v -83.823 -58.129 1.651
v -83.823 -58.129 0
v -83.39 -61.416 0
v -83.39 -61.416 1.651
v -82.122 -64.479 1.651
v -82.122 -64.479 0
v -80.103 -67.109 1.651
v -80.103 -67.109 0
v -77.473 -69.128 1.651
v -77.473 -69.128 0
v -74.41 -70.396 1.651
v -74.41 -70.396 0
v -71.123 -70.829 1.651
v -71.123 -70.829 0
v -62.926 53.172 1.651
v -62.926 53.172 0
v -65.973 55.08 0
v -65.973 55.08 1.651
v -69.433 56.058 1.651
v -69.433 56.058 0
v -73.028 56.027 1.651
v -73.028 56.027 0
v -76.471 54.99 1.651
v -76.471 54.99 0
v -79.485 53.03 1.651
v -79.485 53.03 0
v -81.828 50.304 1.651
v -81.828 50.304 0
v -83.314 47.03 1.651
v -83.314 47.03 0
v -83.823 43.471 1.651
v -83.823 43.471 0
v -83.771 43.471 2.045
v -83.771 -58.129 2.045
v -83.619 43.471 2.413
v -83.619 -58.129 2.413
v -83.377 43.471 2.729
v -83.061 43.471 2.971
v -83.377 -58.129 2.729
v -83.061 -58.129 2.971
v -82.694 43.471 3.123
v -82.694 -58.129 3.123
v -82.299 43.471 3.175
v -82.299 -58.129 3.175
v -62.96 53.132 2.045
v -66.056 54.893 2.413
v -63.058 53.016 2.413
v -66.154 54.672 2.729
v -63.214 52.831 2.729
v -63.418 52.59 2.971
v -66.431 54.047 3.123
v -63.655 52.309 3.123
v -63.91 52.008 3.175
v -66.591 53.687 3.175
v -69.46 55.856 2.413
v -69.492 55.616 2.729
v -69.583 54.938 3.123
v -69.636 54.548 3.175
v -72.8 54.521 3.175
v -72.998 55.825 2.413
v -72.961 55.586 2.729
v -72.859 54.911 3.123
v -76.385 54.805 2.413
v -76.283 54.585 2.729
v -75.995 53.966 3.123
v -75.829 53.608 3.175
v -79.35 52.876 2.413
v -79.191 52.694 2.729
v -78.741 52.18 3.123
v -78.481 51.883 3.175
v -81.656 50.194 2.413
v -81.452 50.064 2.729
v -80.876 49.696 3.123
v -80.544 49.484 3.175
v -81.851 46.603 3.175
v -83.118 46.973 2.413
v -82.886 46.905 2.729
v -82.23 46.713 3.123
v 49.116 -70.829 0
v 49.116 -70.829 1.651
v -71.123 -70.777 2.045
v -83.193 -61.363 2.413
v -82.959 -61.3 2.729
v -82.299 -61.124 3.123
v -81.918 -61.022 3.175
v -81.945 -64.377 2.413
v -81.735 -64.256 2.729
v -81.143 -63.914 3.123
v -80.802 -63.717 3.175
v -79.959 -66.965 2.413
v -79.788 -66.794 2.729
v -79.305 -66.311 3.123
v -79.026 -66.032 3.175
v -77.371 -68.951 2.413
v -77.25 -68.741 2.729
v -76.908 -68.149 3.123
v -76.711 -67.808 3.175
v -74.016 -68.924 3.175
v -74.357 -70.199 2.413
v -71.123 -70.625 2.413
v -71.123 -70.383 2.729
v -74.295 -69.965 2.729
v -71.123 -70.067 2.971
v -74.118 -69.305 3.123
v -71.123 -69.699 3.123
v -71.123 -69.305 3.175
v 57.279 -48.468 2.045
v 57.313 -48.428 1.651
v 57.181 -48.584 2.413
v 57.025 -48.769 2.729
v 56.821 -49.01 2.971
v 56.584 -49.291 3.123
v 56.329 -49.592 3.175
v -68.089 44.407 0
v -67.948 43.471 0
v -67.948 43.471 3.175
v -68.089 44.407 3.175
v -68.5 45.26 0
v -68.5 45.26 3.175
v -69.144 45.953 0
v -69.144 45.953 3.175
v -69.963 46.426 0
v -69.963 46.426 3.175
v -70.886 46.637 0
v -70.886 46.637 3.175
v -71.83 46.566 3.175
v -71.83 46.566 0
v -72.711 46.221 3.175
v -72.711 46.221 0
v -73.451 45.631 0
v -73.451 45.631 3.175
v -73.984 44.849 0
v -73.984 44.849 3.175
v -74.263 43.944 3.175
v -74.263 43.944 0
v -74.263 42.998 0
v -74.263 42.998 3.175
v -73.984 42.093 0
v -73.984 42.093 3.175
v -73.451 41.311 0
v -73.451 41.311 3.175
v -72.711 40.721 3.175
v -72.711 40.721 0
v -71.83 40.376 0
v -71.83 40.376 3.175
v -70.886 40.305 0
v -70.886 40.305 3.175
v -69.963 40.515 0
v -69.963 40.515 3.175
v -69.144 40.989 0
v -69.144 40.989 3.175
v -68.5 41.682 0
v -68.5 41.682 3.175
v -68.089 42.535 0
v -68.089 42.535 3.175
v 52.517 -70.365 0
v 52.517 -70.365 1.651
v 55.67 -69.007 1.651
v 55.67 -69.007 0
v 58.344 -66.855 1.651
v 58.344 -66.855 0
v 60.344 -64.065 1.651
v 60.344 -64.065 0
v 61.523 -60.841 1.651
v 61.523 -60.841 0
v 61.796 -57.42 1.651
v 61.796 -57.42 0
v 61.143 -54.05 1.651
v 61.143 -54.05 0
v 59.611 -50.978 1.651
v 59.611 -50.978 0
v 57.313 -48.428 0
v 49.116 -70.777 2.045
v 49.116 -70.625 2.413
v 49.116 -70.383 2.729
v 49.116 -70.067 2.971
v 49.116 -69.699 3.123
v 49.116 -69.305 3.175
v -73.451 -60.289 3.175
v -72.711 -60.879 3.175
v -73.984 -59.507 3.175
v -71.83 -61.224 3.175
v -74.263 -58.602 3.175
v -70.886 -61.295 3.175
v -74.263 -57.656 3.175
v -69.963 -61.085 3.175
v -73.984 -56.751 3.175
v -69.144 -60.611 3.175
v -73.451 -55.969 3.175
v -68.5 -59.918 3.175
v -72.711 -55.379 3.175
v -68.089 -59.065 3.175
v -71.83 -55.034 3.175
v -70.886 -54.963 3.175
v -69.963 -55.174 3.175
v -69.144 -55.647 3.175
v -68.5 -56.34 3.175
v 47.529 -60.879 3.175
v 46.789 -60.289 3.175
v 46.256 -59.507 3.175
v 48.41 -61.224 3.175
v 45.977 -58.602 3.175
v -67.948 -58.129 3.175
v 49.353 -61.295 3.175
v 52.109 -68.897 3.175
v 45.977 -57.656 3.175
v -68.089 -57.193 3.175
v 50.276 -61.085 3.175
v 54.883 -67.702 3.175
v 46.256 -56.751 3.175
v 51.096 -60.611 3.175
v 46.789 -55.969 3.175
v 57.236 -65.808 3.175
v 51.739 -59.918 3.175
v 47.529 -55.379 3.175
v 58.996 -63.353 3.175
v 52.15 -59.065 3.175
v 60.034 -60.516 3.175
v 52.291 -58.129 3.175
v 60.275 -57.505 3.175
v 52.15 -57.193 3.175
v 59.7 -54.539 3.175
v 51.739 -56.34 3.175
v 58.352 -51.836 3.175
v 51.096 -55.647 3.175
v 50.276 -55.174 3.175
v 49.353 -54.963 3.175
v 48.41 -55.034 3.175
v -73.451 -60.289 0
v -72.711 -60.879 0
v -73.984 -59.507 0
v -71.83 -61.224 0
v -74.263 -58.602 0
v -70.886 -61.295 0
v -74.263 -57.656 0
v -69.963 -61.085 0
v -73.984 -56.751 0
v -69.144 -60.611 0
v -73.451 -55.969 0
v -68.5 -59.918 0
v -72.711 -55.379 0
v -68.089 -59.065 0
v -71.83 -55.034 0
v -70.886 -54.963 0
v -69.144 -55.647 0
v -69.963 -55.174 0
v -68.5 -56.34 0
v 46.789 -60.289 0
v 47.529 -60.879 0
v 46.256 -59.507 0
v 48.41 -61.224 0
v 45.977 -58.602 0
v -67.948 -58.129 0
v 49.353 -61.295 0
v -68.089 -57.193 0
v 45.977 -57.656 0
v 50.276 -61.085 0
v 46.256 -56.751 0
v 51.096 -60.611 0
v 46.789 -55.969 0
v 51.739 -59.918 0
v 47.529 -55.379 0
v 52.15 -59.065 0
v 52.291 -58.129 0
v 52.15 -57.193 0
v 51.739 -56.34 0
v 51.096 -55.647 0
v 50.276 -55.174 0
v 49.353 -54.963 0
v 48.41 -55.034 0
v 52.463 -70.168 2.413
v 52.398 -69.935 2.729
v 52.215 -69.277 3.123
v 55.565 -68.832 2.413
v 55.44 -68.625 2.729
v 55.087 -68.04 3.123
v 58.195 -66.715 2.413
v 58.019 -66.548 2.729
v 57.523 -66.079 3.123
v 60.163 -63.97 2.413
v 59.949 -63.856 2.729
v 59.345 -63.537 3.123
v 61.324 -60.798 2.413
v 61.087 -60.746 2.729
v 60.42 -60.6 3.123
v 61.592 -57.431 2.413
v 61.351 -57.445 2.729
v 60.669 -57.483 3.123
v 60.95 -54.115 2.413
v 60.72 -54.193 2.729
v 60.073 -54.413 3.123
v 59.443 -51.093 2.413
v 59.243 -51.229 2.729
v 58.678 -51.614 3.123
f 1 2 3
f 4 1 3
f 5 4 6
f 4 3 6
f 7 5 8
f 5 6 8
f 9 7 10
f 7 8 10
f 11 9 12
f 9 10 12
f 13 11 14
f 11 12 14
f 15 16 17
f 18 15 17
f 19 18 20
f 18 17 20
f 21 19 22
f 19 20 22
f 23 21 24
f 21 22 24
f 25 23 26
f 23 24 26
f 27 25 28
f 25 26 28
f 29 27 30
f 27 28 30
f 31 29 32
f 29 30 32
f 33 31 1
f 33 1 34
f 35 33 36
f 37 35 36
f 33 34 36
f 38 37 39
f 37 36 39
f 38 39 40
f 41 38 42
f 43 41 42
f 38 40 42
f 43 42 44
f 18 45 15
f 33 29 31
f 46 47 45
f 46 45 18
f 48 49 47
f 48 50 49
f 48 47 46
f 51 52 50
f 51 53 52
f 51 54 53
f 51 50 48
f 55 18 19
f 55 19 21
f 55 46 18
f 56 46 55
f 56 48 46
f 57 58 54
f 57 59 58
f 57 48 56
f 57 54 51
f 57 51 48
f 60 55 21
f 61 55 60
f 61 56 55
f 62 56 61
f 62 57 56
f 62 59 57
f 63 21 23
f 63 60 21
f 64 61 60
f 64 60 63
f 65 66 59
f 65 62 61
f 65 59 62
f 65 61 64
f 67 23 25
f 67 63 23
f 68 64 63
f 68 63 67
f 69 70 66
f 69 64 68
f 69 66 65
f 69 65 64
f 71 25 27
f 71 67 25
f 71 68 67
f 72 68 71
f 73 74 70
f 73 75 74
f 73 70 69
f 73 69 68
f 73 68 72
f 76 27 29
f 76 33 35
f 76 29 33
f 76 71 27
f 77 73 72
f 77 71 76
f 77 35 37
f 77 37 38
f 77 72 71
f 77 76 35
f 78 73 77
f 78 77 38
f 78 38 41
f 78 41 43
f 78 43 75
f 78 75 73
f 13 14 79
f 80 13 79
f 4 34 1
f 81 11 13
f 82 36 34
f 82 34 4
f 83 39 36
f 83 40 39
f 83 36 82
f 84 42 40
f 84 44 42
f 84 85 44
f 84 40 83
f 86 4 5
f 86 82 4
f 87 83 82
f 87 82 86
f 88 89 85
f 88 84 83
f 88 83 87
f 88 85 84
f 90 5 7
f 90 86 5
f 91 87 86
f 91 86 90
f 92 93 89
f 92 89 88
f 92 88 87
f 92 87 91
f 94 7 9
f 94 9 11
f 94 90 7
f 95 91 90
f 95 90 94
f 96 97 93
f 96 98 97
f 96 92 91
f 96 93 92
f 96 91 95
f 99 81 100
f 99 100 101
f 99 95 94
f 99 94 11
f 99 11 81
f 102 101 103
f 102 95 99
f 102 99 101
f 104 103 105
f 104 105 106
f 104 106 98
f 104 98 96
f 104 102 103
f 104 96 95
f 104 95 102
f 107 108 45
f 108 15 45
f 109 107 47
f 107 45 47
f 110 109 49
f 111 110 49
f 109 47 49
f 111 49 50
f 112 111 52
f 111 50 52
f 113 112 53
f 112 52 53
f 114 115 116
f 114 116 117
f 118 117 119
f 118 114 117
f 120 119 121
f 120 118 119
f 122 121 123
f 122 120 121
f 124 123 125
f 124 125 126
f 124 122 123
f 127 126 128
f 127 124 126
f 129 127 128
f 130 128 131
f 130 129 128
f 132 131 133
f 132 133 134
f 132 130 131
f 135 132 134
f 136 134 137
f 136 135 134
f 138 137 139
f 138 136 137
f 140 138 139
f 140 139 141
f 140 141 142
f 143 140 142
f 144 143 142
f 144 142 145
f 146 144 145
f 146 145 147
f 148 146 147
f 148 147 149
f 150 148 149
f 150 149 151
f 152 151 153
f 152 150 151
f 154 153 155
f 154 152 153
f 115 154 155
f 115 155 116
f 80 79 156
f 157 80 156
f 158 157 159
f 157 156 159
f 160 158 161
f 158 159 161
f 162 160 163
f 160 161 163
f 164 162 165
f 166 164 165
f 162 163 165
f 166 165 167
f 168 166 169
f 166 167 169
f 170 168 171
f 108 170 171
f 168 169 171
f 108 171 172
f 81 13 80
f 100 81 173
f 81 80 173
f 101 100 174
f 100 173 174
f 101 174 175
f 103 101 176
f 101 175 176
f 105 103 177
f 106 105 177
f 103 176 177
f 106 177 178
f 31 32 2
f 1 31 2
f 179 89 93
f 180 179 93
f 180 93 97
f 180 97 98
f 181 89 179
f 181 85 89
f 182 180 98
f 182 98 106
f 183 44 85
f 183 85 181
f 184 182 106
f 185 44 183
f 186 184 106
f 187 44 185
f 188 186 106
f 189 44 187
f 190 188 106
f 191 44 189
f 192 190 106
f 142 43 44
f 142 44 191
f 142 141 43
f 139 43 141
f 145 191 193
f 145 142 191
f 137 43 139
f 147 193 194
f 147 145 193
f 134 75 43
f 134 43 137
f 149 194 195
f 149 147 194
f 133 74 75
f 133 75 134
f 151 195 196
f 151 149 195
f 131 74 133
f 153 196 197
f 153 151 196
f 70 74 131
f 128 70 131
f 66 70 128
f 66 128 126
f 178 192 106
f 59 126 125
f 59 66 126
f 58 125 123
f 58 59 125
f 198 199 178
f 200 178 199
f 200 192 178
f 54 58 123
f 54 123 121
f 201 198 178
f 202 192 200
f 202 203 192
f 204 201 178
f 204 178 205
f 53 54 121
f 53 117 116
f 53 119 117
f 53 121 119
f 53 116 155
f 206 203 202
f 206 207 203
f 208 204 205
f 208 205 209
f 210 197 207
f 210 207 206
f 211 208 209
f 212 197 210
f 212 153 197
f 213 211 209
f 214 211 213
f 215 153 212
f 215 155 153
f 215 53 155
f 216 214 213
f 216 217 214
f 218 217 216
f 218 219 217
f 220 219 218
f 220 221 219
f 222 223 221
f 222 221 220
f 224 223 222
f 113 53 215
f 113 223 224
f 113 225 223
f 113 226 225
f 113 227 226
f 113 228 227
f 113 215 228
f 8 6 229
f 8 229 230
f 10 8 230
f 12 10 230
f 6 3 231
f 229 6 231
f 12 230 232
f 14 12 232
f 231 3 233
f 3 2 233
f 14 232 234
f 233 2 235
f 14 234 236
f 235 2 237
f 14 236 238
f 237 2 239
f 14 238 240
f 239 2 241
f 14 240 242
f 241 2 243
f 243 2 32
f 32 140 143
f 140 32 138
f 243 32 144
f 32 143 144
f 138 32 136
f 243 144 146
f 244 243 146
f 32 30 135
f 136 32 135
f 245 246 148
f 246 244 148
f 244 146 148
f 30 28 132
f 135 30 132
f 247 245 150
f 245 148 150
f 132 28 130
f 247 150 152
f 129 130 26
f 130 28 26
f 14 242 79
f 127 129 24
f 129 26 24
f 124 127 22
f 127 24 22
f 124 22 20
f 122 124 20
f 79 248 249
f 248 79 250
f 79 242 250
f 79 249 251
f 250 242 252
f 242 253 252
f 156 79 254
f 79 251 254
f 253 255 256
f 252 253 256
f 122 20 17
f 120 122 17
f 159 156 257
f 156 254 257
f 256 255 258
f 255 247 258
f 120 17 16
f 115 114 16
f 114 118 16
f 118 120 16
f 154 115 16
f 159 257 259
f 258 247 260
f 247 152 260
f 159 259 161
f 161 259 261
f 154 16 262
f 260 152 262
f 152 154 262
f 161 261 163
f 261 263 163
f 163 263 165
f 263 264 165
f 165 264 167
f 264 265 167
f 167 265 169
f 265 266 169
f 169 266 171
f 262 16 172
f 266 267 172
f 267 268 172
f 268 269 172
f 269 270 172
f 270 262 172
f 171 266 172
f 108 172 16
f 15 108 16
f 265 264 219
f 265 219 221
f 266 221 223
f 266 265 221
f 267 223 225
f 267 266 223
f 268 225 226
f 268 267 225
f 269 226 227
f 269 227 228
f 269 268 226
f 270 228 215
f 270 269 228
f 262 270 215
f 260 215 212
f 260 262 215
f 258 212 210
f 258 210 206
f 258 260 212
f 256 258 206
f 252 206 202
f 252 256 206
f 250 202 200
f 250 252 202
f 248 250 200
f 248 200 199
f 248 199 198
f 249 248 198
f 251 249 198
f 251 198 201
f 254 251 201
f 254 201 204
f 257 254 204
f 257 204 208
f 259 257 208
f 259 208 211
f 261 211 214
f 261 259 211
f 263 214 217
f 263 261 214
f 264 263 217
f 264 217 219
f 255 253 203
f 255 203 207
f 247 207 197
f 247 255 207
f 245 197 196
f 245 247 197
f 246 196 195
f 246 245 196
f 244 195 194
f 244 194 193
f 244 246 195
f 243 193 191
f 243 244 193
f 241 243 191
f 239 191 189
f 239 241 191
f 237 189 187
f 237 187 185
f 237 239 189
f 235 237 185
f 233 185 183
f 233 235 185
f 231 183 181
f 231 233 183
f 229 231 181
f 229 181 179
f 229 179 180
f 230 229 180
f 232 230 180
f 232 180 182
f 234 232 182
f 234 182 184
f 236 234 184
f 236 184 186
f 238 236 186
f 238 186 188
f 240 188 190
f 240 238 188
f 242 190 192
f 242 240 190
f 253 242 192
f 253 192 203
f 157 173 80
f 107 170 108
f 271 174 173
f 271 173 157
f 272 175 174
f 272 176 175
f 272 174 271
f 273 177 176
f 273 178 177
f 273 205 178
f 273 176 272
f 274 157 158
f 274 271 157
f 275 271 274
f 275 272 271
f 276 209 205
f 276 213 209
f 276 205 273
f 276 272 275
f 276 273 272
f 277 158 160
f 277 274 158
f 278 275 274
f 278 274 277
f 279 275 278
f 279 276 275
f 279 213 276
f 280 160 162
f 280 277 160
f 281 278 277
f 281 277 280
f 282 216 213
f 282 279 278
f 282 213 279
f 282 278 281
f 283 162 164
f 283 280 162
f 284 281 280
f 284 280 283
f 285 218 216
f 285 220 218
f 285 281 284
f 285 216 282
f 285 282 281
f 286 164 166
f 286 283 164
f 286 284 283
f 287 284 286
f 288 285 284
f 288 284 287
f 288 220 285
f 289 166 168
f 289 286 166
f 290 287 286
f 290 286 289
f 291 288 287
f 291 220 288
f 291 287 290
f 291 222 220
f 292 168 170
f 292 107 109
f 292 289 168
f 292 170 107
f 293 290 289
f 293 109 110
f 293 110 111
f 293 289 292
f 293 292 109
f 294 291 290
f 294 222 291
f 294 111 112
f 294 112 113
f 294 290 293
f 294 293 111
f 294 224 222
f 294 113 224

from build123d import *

# Parameters (mm, degrees)
F0_R     = 3.175
F1_DEPTH = 3.175
F2_R     = 1.524


with BuildPart() as f1:
    # F0 (on Top) → F1 (new body)
    with BuildSketch(Plane.XY):
        with BuildLine():
            Line((-71.123174, -70.829025), (49.116155, -70.829025))
            ThreePointArc((49.116155, -70.829025), (61.042759, -62.493211), (57.312992, -48.428414))
            Line((57.312992, -48.428414), (-62.926338, 53.171586))
            ThreePointArc((-62.926338, 53.171586), (-76.470612, 54.990303), (-83.823174, 43.470975))
            Line((-83.823174, 43.470975), (-83.823174, -58.129025))
            ThreePointArc((-83.823174, -58.129025), (-80.10343, -67.109281), (-71.123174, -70.829025))
        make_face()
        with Locations((-71.123174, -58.129025)):
            Circle(F0_R, mode=Mode.SUBTRACT)
        with Locations((49.116155, -58.129025)):
            Circle(F0_R, mode=Mode.SUBTRACT)
        with Locations((-71.123174, 43.470975)):
            Circle(F0_R, mode=Mode.SUBTRACT)
    extrude(amount=F1_DEPTH)

    # F2
    f2_edges = [f1.edges().sort_by_distance(p)[0] for p in [
        (-83.823174, -7.329025, 3.175),
    ]]
    fillet(f2_edges, radius=F2_R)


solid = f1.part
